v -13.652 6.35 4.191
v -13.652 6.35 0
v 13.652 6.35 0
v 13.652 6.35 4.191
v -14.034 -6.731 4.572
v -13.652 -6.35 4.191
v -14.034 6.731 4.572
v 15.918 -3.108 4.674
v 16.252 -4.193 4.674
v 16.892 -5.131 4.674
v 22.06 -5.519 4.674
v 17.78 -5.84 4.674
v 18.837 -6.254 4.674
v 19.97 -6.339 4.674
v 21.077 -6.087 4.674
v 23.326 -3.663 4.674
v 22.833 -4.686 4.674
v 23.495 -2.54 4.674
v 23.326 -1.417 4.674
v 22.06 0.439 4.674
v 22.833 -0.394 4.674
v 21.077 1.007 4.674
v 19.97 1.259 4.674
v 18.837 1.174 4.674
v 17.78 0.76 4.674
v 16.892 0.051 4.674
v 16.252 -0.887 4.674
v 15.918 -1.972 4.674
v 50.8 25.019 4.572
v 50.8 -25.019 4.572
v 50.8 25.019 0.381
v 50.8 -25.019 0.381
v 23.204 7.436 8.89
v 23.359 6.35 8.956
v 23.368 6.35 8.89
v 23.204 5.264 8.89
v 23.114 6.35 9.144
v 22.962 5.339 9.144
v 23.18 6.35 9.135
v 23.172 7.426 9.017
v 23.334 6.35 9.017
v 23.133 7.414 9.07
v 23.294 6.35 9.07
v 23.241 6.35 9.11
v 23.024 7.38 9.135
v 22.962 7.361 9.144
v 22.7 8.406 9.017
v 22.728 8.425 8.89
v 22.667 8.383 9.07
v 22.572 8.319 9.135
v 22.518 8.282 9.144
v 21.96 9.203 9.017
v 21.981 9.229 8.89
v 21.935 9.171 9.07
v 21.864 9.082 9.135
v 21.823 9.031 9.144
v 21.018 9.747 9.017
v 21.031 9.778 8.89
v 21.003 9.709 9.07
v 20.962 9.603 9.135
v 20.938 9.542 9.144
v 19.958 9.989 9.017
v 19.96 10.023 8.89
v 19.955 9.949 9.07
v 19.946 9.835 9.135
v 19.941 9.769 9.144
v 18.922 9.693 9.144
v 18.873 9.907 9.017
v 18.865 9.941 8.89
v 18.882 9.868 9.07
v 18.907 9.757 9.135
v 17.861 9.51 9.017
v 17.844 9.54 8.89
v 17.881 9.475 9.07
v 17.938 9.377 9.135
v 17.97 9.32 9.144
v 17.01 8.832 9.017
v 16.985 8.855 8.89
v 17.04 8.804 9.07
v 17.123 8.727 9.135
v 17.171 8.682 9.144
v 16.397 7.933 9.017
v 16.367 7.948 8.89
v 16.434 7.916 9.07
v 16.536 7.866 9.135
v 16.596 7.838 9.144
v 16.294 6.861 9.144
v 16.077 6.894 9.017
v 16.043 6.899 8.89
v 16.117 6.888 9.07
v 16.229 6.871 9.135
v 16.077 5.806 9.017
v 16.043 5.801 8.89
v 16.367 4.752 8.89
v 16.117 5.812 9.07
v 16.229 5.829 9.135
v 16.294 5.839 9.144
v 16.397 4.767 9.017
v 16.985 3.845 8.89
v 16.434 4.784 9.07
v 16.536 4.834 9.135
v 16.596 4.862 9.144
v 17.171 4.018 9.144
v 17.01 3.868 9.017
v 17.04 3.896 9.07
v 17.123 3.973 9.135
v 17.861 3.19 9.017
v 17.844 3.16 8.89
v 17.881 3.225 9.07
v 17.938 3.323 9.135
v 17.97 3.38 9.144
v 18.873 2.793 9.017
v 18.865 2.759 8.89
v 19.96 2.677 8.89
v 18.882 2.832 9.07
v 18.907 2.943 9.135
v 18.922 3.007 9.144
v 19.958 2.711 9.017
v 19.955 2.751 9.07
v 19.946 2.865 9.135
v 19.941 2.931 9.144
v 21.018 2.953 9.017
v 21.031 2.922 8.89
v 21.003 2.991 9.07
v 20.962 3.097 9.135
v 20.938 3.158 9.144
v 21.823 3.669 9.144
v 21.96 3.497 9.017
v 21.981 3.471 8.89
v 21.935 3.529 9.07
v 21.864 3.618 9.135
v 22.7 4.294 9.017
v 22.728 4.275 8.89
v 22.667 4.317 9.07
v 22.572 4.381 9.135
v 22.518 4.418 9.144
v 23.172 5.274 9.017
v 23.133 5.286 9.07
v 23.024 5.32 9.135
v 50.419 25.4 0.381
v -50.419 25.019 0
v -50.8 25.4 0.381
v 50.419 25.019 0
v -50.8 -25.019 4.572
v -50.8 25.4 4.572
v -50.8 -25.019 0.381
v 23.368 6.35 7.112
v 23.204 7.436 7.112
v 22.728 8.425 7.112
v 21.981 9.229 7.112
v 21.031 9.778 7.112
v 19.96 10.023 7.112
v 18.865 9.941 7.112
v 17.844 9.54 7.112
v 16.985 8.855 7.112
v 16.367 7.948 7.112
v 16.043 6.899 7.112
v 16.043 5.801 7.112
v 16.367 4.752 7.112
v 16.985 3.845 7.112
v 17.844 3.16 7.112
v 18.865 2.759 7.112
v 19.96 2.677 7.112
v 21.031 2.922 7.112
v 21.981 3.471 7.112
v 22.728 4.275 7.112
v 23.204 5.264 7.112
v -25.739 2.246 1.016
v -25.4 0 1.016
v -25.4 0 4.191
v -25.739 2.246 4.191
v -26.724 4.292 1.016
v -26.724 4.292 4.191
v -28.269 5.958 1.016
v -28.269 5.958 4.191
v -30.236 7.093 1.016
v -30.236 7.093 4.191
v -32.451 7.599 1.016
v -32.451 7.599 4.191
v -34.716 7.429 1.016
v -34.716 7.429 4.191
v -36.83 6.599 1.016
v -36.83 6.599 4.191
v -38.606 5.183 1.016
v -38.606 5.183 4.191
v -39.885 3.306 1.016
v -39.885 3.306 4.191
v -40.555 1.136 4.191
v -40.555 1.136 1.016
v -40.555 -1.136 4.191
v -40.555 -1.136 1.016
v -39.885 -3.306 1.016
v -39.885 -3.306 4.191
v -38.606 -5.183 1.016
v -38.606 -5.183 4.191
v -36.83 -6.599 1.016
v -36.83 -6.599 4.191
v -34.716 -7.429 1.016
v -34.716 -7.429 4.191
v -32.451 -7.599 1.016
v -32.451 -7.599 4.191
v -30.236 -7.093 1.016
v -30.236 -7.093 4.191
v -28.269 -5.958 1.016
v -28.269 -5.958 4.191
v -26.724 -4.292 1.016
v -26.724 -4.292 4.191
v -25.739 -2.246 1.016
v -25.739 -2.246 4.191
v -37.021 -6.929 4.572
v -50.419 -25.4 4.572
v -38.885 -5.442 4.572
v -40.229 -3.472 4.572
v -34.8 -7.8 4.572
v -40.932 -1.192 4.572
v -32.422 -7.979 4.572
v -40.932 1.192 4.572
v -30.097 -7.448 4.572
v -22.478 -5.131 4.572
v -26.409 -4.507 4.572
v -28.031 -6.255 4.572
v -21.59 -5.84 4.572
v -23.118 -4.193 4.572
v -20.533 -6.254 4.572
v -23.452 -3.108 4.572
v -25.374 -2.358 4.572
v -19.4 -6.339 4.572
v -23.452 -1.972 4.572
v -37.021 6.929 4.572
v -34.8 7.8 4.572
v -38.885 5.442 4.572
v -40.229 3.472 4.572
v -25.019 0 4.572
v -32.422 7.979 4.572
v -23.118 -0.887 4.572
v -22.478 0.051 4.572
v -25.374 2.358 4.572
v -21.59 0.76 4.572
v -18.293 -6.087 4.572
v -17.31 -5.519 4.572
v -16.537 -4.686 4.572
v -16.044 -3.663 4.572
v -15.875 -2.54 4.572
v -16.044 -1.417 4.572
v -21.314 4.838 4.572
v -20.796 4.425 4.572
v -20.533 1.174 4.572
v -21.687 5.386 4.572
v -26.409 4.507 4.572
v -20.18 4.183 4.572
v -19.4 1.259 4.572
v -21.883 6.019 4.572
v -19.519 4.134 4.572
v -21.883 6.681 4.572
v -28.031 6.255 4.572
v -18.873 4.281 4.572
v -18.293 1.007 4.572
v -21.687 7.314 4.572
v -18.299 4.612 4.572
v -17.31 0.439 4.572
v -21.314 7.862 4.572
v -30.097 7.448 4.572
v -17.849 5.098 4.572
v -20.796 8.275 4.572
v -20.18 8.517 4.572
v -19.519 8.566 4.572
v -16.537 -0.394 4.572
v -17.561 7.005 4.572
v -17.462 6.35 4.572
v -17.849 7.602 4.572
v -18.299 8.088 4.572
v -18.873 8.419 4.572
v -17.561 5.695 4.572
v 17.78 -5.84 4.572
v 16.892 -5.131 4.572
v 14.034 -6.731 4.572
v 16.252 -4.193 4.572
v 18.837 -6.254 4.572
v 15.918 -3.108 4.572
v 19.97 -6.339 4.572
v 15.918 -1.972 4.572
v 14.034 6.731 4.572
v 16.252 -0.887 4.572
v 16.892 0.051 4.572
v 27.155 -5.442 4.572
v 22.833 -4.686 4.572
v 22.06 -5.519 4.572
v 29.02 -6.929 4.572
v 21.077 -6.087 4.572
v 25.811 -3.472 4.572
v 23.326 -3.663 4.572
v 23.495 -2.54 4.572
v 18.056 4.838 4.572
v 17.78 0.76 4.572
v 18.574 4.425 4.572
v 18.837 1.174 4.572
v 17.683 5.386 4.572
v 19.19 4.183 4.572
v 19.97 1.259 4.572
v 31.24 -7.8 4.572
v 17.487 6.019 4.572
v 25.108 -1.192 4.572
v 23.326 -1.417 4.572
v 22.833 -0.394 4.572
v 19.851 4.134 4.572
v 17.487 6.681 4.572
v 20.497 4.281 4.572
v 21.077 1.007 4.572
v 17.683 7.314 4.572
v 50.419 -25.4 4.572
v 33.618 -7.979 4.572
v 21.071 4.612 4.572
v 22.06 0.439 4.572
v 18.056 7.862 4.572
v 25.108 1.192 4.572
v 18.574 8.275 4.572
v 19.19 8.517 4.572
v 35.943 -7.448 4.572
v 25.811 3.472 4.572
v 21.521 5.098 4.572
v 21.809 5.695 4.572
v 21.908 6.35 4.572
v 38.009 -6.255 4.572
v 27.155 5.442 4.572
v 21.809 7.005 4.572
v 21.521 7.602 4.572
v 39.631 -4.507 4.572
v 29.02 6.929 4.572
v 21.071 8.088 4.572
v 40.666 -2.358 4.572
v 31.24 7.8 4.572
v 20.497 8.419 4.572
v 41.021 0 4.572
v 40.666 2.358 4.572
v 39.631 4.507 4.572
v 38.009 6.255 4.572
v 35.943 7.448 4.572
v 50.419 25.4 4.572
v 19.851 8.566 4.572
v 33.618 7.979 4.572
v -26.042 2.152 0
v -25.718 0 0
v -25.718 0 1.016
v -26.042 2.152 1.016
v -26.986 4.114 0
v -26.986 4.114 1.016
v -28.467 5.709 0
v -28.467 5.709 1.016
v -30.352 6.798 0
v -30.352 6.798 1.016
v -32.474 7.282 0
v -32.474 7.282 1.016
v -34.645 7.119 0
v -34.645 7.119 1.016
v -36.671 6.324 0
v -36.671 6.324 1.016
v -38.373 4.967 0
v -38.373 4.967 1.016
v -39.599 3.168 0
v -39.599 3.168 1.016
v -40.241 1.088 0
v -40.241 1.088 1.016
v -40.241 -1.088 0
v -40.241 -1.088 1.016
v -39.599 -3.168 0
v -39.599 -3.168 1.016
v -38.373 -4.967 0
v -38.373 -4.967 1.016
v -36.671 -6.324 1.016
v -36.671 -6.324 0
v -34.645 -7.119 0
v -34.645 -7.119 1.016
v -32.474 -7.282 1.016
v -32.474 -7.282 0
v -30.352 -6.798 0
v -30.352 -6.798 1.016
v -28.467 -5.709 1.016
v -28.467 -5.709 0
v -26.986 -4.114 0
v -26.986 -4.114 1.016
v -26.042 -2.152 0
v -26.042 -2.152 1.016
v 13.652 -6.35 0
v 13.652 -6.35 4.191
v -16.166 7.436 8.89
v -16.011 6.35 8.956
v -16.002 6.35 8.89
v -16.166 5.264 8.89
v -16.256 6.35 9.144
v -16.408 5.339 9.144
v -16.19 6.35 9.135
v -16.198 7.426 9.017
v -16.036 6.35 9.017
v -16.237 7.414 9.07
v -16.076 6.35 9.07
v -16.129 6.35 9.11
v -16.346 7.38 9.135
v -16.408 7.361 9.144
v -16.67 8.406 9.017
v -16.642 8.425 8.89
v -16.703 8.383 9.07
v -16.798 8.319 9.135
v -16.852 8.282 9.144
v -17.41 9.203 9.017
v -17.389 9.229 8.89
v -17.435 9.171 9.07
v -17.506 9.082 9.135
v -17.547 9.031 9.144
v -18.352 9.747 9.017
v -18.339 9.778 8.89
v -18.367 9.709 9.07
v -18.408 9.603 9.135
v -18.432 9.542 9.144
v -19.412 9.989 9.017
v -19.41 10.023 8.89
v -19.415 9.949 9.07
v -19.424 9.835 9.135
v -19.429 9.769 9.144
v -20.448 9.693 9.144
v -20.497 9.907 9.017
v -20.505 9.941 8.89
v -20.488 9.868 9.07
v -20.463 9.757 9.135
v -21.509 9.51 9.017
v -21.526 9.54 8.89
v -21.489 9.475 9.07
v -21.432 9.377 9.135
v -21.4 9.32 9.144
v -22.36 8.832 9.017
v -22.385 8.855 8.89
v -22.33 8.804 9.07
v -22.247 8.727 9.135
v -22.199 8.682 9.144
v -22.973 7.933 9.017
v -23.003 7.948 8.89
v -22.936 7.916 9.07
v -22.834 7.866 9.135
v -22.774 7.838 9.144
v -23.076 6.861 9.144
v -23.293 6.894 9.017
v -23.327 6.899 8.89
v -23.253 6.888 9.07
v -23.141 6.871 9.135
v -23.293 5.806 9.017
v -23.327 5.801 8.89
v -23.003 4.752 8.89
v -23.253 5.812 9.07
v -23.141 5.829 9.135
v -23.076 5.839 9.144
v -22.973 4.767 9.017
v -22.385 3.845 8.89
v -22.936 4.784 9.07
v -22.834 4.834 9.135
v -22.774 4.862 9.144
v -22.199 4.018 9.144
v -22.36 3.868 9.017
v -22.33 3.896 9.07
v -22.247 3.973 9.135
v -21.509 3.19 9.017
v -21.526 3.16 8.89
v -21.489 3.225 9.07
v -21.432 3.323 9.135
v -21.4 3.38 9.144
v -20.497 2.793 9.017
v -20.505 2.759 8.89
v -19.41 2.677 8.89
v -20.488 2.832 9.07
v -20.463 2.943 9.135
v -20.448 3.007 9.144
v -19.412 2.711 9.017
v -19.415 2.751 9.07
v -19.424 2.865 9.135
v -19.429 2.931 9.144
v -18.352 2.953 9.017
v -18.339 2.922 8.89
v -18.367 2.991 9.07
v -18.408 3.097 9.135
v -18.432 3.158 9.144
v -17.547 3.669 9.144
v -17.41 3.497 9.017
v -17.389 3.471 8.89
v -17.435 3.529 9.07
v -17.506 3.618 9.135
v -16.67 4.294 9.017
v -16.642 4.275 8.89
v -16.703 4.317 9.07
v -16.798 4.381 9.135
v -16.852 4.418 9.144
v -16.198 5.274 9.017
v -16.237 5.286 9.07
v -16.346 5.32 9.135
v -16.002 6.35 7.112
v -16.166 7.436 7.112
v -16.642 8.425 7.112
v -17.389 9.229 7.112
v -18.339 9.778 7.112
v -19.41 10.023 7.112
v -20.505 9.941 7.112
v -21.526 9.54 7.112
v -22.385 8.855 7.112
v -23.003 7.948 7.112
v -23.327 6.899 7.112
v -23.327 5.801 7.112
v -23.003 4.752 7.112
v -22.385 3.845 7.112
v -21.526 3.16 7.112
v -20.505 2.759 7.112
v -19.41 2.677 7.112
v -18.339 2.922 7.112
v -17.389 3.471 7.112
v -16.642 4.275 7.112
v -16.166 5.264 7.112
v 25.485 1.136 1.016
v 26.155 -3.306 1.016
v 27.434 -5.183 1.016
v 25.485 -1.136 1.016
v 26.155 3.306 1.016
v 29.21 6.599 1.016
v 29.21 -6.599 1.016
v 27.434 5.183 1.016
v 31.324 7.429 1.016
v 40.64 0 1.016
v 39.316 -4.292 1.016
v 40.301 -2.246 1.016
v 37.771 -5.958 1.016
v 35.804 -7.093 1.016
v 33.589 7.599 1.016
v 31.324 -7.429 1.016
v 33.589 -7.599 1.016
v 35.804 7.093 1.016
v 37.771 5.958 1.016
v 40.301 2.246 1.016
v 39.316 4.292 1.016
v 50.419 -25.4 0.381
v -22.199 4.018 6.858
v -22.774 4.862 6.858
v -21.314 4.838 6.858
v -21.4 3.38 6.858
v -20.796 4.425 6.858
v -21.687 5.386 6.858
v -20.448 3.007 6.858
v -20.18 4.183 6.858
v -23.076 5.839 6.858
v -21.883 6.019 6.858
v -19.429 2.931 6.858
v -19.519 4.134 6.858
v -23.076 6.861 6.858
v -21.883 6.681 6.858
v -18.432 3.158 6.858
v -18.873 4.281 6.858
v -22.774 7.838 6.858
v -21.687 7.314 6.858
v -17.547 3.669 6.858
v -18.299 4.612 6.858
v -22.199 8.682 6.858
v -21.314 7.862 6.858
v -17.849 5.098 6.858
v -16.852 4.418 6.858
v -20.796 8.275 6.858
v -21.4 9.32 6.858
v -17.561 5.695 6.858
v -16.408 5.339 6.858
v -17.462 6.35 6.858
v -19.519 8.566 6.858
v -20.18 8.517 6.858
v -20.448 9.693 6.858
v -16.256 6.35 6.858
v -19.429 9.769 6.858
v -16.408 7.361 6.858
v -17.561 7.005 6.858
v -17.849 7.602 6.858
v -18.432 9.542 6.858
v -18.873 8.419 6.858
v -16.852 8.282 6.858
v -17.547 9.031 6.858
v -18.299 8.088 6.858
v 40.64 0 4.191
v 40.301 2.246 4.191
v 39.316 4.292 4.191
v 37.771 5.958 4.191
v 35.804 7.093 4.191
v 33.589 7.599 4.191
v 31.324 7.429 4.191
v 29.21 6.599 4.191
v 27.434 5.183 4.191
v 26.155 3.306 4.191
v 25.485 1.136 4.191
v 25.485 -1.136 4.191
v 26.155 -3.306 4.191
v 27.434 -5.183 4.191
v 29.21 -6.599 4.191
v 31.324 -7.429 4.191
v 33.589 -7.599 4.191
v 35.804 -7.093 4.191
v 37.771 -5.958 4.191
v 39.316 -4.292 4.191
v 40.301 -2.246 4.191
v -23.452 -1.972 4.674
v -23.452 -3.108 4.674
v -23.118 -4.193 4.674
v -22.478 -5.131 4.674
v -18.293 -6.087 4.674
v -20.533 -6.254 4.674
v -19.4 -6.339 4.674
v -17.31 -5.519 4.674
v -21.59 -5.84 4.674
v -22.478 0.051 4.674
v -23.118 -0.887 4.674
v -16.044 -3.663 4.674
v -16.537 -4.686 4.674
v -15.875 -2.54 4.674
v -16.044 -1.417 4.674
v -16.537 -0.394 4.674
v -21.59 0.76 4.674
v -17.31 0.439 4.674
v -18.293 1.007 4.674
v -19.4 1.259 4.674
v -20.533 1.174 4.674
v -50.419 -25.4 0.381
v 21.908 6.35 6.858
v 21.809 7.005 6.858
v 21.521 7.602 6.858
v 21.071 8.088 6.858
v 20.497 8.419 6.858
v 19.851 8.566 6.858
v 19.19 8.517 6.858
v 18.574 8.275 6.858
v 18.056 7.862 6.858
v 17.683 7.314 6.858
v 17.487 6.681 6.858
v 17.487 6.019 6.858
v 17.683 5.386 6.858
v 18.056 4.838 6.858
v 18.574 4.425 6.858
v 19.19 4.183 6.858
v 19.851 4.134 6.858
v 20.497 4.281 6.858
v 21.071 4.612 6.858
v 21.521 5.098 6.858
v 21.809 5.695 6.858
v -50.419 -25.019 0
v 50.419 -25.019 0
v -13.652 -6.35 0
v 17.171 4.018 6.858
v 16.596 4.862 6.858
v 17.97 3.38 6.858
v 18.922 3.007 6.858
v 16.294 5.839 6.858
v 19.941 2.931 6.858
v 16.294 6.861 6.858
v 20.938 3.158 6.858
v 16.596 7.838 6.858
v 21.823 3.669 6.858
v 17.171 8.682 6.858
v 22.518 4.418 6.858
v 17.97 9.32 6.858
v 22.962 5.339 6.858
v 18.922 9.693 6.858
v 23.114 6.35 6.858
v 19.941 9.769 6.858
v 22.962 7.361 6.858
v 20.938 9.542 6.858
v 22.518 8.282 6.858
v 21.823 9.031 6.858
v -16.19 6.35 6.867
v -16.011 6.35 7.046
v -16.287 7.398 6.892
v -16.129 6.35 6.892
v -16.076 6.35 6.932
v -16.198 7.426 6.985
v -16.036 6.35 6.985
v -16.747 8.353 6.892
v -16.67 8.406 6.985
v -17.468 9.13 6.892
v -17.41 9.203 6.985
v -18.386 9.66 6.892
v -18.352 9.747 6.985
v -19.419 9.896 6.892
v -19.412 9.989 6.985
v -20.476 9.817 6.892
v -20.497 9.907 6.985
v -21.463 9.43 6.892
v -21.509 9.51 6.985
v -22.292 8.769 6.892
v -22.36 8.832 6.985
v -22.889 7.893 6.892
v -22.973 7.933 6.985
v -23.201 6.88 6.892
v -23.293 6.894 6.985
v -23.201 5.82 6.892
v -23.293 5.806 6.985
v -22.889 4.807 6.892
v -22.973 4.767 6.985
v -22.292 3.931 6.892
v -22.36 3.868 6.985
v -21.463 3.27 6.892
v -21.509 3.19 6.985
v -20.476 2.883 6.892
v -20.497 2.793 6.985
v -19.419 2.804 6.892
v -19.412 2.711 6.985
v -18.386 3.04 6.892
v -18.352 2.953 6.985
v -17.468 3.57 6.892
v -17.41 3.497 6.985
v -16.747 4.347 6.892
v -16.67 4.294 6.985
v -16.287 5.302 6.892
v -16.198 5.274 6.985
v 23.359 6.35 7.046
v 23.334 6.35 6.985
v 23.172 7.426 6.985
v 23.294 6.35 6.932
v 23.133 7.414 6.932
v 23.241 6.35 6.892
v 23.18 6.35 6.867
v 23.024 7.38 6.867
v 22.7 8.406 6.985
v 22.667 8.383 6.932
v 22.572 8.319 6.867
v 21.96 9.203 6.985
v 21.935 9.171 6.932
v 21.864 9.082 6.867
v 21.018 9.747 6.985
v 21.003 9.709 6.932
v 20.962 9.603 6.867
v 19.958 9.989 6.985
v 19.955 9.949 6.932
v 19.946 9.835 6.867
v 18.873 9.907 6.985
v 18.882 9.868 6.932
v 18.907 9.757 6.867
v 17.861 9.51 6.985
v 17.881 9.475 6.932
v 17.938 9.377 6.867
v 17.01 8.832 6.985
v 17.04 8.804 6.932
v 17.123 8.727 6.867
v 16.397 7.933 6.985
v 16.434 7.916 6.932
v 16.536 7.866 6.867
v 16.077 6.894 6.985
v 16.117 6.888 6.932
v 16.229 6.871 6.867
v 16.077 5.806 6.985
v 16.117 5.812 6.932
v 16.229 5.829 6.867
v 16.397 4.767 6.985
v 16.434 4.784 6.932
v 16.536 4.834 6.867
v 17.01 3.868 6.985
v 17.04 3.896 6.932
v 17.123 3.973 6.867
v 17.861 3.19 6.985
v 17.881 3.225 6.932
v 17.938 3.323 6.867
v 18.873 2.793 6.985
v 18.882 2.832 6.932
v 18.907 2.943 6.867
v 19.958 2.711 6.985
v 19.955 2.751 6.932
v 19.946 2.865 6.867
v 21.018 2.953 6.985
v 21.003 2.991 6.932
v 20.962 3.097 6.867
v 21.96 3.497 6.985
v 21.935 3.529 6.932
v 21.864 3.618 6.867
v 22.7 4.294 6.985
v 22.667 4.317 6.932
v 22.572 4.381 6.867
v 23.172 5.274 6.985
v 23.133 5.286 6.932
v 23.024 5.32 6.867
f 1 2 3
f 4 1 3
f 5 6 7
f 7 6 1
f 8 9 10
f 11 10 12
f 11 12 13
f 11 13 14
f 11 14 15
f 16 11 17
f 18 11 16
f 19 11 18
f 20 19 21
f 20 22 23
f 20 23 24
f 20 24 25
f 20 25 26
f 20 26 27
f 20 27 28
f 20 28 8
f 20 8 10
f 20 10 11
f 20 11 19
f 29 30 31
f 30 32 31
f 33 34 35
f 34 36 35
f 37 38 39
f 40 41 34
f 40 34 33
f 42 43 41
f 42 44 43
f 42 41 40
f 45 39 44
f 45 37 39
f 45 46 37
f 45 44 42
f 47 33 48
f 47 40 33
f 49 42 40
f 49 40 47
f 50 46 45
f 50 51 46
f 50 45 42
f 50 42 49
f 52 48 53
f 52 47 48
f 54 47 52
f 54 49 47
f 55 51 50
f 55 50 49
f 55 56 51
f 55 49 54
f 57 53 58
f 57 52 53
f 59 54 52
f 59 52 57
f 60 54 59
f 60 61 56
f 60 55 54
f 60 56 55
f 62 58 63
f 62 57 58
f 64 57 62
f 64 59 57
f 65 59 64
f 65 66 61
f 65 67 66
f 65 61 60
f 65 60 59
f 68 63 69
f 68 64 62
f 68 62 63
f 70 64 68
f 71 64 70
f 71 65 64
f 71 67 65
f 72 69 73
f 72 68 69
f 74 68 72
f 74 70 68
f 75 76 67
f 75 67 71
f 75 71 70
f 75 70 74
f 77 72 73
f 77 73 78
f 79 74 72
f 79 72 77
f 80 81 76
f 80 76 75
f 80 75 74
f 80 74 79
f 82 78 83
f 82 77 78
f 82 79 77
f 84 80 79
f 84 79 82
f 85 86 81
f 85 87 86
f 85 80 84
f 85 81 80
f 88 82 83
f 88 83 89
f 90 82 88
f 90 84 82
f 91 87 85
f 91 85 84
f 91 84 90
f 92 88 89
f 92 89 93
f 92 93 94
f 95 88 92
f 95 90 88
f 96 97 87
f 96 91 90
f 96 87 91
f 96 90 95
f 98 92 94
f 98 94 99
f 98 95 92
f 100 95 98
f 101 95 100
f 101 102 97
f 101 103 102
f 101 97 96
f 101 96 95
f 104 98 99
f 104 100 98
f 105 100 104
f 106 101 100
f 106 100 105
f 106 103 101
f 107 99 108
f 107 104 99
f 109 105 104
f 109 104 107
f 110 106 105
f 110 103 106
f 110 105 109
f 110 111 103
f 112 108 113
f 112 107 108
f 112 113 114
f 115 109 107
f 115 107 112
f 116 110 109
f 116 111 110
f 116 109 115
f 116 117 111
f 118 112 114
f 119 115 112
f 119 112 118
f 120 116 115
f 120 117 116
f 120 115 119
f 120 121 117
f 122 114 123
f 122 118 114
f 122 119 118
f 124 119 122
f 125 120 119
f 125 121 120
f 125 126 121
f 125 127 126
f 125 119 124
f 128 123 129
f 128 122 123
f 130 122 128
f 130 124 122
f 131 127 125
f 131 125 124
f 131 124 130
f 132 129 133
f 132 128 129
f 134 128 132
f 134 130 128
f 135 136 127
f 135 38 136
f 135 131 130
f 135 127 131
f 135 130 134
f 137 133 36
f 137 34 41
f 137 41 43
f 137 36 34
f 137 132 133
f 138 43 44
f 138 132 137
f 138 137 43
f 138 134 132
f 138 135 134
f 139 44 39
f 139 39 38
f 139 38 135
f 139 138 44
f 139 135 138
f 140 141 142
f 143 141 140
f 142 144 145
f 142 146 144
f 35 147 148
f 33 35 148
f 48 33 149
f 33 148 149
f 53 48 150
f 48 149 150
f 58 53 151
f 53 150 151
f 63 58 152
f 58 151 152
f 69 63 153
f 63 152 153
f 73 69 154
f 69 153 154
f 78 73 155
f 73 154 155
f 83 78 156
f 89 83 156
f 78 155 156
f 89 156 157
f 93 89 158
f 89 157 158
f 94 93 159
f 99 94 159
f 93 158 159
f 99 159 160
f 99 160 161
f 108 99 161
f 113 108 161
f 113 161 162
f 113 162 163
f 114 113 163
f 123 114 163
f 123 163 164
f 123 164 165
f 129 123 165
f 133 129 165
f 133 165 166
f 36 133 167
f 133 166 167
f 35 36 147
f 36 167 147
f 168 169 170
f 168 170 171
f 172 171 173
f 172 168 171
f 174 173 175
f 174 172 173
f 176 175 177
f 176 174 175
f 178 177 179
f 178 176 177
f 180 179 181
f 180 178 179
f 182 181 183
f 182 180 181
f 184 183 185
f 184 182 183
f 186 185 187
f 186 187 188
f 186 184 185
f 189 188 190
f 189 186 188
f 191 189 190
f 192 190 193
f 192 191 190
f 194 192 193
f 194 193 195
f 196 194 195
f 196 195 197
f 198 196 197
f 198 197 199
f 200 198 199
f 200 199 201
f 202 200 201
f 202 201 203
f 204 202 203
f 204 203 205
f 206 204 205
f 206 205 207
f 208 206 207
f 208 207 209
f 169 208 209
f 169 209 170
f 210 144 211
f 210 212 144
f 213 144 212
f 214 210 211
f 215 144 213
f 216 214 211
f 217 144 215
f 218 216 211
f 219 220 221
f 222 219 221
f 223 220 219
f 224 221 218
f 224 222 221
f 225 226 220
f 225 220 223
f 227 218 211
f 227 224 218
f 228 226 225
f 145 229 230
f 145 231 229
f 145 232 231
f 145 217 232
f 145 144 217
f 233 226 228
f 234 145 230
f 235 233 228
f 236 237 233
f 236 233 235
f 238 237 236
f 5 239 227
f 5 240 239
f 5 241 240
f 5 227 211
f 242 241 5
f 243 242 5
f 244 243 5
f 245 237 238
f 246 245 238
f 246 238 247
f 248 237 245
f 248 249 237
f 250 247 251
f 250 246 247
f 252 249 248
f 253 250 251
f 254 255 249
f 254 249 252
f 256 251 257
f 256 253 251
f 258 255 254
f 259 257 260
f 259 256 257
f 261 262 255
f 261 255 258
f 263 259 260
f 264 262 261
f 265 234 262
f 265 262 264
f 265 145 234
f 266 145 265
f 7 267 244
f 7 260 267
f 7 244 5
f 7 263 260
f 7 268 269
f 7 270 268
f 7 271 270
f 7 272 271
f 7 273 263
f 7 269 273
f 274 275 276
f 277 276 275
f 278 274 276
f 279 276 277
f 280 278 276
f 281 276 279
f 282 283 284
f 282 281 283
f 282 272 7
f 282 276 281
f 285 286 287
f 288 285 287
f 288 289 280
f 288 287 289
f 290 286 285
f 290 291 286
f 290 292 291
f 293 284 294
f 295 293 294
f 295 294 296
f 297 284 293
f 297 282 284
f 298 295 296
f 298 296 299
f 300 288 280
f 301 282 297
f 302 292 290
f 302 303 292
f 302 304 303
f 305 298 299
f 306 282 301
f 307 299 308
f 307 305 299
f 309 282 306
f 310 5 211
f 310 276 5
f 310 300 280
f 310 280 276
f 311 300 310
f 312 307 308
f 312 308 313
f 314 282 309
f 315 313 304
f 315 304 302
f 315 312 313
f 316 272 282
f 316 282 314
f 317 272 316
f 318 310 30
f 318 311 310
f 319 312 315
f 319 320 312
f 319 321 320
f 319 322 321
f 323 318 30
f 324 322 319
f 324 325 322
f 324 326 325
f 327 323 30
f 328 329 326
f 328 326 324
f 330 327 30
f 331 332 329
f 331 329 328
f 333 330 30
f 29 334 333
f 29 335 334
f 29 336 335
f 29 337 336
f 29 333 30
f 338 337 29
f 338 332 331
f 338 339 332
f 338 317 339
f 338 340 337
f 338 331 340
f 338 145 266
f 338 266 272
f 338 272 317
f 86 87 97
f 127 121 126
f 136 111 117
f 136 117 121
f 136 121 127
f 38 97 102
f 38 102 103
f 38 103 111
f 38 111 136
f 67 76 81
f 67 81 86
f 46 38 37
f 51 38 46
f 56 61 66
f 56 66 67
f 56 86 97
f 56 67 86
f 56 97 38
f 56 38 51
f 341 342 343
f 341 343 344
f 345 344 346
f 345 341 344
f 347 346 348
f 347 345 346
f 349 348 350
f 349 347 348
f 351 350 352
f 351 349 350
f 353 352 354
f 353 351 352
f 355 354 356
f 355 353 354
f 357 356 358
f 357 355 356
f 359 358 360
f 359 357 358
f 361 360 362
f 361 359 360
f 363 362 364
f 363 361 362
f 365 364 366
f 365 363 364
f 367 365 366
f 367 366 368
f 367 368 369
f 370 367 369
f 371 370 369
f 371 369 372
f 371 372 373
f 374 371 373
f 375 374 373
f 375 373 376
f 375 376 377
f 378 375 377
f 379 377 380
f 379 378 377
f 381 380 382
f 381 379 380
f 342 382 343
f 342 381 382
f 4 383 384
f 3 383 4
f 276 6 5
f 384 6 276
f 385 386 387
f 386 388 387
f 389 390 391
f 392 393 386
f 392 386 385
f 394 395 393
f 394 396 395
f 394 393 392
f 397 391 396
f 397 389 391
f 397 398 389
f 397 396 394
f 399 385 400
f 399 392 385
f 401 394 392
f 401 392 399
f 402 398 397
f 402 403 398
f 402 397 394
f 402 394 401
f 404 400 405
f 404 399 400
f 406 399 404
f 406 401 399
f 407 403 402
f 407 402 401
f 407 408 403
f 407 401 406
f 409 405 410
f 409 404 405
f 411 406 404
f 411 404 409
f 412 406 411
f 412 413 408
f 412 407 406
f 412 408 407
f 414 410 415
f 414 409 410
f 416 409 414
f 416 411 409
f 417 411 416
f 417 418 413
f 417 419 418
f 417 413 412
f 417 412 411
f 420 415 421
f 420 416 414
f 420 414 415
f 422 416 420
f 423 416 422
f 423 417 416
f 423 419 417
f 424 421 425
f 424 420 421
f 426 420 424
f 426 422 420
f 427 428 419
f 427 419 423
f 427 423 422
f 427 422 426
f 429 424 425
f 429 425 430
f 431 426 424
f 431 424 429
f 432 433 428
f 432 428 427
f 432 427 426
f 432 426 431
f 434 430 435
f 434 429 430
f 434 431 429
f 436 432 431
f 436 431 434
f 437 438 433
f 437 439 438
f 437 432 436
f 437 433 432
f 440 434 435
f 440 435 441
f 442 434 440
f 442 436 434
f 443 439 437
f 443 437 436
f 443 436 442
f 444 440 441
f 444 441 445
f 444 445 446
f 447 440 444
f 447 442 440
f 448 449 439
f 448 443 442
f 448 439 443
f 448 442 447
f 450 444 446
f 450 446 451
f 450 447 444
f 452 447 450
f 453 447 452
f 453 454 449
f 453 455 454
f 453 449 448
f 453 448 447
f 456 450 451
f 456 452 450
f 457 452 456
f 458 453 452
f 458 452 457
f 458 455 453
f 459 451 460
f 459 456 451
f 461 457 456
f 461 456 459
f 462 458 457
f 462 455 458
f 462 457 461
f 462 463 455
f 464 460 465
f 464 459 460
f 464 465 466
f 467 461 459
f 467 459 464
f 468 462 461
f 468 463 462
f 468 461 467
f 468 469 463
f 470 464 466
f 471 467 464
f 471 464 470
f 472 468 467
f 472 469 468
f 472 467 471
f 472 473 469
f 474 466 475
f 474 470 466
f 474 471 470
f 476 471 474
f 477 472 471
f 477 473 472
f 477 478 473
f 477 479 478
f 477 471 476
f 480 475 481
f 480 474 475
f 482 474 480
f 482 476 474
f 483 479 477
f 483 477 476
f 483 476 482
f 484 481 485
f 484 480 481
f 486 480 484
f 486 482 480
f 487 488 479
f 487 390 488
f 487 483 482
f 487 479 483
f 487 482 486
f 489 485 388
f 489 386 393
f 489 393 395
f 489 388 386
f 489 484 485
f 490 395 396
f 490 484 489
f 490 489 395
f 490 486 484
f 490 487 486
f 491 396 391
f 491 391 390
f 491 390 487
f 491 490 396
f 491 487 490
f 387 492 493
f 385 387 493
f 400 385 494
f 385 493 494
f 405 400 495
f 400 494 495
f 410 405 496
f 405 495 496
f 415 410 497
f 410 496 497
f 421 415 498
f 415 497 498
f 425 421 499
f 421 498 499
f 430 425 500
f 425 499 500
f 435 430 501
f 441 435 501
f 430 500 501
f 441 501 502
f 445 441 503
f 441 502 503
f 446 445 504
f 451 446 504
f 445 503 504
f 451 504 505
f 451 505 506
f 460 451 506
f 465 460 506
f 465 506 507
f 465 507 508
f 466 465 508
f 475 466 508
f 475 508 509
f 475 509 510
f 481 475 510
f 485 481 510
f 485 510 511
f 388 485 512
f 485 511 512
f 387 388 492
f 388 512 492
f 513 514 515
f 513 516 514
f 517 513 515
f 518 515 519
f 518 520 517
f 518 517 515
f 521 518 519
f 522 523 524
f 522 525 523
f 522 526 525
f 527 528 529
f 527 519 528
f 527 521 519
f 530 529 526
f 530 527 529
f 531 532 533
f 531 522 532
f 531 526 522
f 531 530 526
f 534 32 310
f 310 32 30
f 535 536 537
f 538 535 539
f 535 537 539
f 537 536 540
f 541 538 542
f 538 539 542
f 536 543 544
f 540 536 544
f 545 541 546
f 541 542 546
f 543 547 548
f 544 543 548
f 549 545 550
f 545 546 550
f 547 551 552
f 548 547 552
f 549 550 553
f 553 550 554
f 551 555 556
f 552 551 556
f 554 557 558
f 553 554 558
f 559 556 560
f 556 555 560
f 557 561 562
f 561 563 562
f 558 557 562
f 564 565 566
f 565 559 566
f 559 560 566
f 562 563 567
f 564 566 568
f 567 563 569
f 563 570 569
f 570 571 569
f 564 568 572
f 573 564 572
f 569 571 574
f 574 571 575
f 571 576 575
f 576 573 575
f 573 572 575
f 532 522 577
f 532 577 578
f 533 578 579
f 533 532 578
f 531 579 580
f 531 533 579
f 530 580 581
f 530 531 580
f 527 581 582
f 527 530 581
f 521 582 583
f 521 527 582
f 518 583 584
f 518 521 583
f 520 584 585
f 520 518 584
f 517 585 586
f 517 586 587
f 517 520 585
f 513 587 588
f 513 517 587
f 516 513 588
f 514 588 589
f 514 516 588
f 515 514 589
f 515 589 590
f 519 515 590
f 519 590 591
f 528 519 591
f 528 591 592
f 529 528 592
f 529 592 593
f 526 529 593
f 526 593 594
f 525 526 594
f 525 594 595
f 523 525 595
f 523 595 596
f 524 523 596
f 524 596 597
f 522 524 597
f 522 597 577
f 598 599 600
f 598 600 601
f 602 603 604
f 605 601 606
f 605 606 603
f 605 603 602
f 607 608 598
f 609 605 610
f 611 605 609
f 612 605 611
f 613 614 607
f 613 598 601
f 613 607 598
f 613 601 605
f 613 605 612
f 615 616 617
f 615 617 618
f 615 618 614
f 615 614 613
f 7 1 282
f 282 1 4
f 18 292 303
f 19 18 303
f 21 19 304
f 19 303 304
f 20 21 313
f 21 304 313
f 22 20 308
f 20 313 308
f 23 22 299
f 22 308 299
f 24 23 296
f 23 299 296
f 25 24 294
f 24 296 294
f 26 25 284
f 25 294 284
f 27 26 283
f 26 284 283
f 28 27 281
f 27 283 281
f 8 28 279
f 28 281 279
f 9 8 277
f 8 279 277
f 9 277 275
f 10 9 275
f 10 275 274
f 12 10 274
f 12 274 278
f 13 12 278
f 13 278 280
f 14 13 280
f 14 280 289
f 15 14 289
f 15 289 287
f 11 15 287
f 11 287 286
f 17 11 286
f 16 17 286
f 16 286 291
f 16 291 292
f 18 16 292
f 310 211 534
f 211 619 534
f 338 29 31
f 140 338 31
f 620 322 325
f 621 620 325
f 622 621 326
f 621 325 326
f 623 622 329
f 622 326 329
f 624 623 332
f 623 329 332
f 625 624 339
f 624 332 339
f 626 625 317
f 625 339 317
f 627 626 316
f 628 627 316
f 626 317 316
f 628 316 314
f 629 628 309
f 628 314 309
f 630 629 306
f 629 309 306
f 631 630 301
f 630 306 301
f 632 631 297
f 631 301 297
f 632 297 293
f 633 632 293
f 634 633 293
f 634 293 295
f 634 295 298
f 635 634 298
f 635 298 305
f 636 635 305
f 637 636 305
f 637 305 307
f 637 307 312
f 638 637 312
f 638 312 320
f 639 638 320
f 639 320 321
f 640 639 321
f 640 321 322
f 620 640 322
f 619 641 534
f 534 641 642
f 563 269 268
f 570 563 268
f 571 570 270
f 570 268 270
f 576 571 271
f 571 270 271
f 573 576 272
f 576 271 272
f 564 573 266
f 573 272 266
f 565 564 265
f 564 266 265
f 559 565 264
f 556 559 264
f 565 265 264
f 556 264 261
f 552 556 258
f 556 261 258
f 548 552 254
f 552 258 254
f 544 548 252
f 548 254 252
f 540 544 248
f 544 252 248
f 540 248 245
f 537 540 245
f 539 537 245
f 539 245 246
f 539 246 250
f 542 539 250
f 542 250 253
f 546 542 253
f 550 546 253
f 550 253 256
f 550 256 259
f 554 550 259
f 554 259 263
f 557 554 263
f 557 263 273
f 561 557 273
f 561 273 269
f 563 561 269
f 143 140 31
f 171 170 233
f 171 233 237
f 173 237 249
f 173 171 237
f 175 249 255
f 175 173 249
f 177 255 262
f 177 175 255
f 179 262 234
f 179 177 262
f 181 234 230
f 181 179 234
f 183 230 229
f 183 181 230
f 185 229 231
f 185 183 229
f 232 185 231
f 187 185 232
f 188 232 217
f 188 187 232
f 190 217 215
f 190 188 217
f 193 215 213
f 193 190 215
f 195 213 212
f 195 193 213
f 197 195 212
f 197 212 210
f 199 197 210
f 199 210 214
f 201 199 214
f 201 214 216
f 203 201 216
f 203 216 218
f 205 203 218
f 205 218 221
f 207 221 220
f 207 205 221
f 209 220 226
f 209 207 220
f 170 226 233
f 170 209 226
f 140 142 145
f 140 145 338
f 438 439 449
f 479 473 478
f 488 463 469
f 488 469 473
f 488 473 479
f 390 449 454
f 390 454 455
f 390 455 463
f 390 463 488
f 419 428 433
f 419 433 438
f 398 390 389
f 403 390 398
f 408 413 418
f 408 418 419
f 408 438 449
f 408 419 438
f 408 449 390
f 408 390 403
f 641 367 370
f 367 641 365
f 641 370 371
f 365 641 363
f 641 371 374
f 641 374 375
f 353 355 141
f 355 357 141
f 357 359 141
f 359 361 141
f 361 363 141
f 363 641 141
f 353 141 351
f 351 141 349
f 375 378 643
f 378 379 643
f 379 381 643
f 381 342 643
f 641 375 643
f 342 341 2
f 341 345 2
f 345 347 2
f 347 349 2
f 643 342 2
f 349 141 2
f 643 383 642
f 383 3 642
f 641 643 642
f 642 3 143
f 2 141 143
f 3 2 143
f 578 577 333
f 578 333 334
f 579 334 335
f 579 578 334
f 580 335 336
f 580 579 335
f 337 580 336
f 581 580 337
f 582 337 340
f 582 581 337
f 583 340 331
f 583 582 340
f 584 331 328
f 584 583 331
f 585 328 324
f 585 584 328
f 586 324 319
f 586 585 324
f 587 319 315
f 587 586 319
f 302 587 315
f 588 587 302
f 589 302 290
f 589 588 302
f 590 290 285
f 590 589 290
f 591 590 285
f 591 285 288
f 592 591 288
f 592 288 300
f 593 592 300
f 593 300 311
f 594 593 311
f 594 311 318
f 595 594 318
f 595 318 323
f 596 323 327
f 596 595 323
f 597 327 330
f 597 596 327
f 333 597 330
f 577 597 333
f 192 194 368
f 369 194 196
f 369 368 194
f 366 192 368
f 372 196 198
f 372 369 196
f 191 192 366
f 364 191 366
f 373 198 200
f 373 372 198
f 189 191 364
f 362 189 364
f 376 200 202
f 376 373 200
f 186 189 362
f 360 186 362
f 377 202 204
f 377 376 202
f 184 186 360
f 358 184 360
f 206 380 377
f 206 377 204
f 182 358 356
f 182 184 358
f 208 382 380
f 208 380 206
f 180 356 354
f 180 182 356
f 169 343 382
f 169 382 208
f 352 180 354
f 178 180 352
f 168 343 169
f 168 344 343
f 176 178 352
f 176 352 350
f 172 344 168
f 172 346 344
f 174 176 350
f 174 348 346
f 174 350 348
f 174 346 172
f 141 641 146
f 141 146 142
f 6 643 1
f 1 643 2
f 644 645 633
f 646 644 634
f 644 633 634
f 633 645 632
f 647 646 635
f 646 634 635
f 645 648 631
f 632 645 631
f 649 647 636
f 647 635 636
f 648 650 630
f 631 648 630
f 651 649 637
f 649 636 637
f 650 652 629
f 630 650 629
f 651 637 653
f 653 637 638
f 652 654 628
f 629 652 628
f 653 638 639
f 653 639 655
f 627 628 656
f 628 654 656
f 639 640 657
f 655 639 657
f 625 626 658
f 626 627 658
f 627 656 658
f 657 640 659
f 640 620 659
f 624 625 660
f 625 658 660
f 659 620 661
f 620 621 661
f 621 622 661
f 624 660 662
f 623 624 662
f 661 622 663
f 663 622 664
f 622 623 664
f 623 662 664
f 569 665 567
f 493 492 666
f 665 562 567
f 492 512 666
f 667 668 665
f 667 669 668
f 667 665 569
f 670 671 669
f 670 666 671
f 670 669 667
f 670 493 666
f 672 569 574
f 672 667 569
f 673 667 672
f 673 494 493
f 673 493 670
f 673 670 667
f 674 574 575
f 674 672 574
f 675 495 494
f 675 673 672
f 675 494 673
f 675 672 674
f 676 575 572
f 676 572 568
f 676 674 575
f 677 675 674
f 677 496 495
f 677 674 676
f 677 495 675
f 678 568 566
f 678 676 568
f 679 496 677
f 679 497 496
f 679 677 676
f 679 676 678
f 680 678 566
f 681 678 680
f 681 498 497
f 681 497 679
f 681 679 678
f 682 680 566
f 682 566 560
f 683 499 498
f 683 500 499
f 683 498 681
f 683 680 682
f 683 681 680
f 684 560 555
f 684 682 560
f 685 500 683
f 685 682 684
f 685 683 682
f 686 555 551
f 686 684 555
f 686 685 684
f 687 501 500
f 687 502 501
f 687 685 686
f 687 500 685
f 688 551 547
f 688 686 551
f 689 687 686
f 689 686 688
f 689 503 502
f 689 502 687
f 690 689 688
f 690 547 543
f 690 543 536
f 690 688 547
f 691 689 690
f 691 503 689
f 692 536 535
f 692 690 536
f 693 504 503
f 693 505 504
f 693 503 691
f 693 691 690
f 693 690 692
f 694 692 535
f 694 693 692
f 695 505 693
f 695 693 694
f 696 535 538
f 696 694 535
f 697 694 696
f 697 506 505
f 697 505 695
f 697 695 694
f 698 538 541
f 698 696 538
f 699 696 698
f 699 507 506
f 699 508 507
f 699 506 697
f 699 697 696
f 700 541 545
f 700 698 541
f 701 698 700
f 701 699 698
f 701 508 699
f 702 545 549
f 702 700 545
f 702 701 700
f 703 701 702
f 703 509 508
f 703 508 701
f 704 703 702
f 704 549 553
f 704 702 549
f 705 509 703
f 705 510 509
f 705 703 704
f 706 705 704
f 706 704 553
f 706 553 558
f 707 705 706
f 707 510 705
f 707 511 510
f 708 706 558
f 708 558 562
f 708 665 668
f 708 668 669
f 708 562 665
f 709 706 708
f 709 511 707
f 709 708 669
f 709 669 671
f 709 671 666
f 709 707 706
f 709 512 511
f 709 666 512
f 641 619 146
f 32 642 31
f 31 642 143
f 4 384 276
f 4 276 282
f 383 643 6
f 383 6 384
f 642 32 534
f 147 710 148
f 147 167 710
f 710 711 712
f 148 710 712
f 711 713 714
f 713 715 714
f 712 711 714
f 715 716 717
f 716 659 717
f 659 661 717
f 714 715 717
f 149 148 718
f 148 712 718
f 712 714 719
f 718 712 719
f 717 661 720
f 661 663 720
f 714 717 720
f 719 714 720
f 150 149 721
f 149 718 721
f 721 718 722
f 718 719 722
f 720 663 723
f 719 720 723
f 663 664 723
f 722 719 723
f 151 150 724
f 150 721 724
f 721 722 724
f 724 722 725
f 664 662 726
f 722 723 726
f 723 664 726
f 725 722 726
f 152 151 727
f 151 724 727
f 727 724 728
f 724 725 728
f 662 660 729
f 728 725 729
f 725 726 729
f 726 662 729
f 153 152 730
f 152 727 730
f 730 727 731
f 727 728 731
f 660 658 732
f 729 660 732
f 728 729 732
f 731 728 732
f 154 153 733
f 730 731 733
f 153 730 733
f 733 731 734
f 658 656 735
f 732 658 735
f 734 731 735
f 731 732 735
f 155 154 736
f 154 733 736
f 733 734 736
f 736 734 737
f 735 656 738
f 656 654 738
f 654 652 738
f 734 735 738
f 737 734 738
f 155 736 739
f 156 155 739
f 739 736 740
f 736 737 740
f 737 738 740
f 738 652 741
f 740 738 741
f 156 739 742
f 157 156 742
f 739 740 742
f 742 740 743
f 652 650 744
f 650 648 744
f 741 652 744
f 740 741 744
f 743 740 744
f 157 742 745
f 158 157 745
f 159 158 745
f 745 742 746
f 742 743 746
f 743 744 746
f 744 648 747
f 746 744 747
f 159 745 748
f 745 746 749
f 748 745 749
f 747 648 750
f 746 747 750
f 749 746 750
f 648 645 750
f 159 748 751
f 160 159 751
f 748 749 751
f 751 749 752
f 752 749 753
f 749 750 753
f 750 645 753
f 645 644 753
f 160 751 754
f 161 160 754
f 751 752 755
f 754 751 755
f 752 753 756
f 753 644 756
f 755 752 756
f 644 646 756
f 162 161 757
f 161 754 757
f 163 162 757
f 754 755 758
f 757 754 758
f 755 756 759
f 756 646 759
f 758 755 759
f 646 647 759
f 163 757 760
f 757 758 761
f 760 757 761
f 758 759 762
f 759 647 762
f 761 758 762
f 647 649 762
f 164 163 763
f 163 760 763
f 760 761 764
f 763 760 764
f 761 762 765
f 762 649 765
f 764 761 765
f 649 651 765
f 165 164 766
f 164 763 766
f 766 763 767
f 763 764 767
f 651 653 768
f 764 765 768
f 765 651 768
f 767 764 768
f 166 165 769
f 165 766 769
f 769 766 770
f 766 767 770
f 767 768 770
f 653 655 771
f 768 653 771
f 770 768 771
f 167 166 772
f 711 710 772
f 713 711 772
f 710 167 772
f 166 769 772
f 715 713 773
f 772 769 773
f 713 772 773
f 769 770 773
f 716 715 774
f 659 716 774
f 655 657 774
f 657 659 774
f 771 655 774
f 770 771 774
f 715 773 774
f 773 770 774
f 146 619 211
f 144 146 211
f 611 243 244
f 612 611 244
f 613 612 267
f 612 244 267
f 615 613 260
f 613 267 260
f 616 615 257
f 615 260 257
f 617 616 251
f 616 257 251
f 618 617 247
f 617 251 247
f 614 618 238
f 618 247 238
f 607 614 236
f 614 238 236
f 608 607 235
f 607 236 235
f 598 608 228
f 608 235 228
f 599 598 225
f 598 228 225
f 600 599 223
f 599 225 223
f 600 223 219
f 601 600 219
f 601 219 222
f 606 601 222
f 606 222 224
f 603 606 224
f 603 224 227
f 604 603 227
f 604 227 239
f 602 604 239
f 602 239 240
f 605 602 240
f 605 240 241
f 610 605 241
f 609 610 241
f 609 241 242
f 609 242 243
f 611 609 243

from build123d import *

# Parameters (mm, degrees)
F0_W     = 101.6
F0_H     = 50.8
F0_R     = 7.62
F0_R_2   = 3.81
F0_W_2   = 27.305
F0_H_2   = 12.7
F0_R_3   = 2.2225
F1_DEPTH = 4.572
F0_R_4   = 7.3025
F2_DEPTH = 1.016
F0_R_5   = 2.2174229623
F3_DEPTH = 6.858
F4_DEPTH = 4.6736
F5_R     = 3.683
F5_R_2   = 2.2225
F6_DEPTH = 2.286
F7_R     = 0.254
F8_SIZE  = 0.381


with BuildPart() as f1:
    # F0 (on Top) → F1 (new body)
    with BuildSketch(Plane.XY):
        Rectangle(F0_W, F0_H)
        with Locations((-33.02, 0)):
            Circle(F0_R, mode=Mode.SUBTRACT)
        with Locations((-19.685, -2.54)):
            Circle(F0_R_2, mode=Mode.SUBTRACT)
        Rectangle(F0_W_2, F0_H_2, mode=Mode.SUBTRACT)
        with Locations((19.685, -2.54)):
            Circle(F0_R_2, mode=Mode.SUBTRACT)
        with Locations((33.02, 0)):
            Circle(F0_R, mode=Mode.SUBTRACT)
        with Locations((-19.685, 6.35)):
            Circle(F0_R_3, mode=Mode.SUBTRACT)
        with Locations((19.685, 6.35)):
            Circle(F0_R_3, mode=Mode.SUBTRACT)
    extrude(amount=F1_DEPTH)

    # F0 (on Top) → F2 (join)
    with BuildSketch(Plane.XY):
        Rectangle(F0_W, F0_H)
        with Locations((-33.02, 0)):
            Circle(F0_R, mode=Mode.SUBTRACT)
        with Locations((-19.685, -2.54)):
            Circle(F0_R_2, mode=Mode.SUBTRACT)
        Rectangle(F0_W_2, F0_H_2, mode=Mode.SUBTRACT)
        with Locations((19.685, -2.54)):
            Circle(F0_R_2, mode=Mode.SUBTRACT)
        with Locations((33.02, 0)):
            Circle(F0_R, mode=Mode.SUBTRACT)
        with Locations((-19.685, 6.35)):
            Circle(F0_R_3, mode=Mode.SUBTRACT)
        with Locations((19.685, 6.35)):
            Circle(F0_R_3, mode=Mode.SUBTRACT)
        with Locations((33.02, 0)):
            Circle(F0_R)
        with Locations((-33.02, 0)):
            Circle(F0_R)
        with Locations((-33.02, 0)):
            Circle(F0_R_4, mode=Mode.SUBTRACT)
    extrude(amount=F2_DEPTH)

    # F0 (on Top) → F3 (join)
    with BuildSketch(Plane.XY):
        with Locations((19.685, 6.35)):
            Circle(F0_R_3)
        with Locations((19.685, 6.35)):
            Circle(F0_R_5, mode=Mode.SUBTRACT)
        with Locations((19.685, 6.35)):
            Circle(F0_R_5)
        with Locations((-19.685, 6.35)):
            Circle(F0_R_3)
    extrude(amount=F3_DEPTH)

    # F0 (on Top) → F4 (join)
    with BuildSketch(Plane.XY):
        with Locations((-19.685, -2.54)):
            Circle(F0_R_2)
        with Locations((19.685, -2.54)):
            Circle(F0_R_2)
    extrude(amount=F4_DEPTH)

    # F5 (on face) → F6 (join)
    with BuildSketch(Plane.XY.offset(6.858)):
        with Locations((19.685, 6.35)):
            Circle(F5_R)
        with Locations((19.685, 6.35)):
            Circle(F5_R_2, mode=Mode.SUBTRACT)
        with Locations((-19.685, 6.35)):
            Circle(F5_R)
        with Locations((19.685, 6.35)):
            Circle(F5_R_2)
    extrude(amount=F6_DEPTH)

    # F7
    f7_edges = [f1.edges().sort_by_distance(p)[0] for p in [
        (-23.368, 6.35, 9.144),
        (-16.002, 6.35, 8.001),
        (-23.368, 6.35, 6.858),
        (16.002, 6.35, 9.144),
        (16.002, 6.35, 6.858),
    ]]
    fillet(f7_edges, radius=F7_R)

    # F8
    f8_edges = [f1.edges().sort_by_distance(p)[0] for p in [
        (25.4, 0, 4.572),
        (-40.64, 0, 4.572),
        (50.8, 25.4, 2.286),
        (0, 25.4, 0),
        (50.8, 0, 0),
        (50.8, -25.4, 2.286),
        (0, -25.4, 0),
        (-50.8, -25.4, 2.286),
        (-50.8, 0, 0),
        (0, 6.35, 4.572),
        (-13.6525, 0, 4.572),
        (0, -6.35, 4.572),
        (13.6525, 0, 4.572),
    ]]
    chamfer(f8_edges, length=F8_SIZE)


solid = f1.part
